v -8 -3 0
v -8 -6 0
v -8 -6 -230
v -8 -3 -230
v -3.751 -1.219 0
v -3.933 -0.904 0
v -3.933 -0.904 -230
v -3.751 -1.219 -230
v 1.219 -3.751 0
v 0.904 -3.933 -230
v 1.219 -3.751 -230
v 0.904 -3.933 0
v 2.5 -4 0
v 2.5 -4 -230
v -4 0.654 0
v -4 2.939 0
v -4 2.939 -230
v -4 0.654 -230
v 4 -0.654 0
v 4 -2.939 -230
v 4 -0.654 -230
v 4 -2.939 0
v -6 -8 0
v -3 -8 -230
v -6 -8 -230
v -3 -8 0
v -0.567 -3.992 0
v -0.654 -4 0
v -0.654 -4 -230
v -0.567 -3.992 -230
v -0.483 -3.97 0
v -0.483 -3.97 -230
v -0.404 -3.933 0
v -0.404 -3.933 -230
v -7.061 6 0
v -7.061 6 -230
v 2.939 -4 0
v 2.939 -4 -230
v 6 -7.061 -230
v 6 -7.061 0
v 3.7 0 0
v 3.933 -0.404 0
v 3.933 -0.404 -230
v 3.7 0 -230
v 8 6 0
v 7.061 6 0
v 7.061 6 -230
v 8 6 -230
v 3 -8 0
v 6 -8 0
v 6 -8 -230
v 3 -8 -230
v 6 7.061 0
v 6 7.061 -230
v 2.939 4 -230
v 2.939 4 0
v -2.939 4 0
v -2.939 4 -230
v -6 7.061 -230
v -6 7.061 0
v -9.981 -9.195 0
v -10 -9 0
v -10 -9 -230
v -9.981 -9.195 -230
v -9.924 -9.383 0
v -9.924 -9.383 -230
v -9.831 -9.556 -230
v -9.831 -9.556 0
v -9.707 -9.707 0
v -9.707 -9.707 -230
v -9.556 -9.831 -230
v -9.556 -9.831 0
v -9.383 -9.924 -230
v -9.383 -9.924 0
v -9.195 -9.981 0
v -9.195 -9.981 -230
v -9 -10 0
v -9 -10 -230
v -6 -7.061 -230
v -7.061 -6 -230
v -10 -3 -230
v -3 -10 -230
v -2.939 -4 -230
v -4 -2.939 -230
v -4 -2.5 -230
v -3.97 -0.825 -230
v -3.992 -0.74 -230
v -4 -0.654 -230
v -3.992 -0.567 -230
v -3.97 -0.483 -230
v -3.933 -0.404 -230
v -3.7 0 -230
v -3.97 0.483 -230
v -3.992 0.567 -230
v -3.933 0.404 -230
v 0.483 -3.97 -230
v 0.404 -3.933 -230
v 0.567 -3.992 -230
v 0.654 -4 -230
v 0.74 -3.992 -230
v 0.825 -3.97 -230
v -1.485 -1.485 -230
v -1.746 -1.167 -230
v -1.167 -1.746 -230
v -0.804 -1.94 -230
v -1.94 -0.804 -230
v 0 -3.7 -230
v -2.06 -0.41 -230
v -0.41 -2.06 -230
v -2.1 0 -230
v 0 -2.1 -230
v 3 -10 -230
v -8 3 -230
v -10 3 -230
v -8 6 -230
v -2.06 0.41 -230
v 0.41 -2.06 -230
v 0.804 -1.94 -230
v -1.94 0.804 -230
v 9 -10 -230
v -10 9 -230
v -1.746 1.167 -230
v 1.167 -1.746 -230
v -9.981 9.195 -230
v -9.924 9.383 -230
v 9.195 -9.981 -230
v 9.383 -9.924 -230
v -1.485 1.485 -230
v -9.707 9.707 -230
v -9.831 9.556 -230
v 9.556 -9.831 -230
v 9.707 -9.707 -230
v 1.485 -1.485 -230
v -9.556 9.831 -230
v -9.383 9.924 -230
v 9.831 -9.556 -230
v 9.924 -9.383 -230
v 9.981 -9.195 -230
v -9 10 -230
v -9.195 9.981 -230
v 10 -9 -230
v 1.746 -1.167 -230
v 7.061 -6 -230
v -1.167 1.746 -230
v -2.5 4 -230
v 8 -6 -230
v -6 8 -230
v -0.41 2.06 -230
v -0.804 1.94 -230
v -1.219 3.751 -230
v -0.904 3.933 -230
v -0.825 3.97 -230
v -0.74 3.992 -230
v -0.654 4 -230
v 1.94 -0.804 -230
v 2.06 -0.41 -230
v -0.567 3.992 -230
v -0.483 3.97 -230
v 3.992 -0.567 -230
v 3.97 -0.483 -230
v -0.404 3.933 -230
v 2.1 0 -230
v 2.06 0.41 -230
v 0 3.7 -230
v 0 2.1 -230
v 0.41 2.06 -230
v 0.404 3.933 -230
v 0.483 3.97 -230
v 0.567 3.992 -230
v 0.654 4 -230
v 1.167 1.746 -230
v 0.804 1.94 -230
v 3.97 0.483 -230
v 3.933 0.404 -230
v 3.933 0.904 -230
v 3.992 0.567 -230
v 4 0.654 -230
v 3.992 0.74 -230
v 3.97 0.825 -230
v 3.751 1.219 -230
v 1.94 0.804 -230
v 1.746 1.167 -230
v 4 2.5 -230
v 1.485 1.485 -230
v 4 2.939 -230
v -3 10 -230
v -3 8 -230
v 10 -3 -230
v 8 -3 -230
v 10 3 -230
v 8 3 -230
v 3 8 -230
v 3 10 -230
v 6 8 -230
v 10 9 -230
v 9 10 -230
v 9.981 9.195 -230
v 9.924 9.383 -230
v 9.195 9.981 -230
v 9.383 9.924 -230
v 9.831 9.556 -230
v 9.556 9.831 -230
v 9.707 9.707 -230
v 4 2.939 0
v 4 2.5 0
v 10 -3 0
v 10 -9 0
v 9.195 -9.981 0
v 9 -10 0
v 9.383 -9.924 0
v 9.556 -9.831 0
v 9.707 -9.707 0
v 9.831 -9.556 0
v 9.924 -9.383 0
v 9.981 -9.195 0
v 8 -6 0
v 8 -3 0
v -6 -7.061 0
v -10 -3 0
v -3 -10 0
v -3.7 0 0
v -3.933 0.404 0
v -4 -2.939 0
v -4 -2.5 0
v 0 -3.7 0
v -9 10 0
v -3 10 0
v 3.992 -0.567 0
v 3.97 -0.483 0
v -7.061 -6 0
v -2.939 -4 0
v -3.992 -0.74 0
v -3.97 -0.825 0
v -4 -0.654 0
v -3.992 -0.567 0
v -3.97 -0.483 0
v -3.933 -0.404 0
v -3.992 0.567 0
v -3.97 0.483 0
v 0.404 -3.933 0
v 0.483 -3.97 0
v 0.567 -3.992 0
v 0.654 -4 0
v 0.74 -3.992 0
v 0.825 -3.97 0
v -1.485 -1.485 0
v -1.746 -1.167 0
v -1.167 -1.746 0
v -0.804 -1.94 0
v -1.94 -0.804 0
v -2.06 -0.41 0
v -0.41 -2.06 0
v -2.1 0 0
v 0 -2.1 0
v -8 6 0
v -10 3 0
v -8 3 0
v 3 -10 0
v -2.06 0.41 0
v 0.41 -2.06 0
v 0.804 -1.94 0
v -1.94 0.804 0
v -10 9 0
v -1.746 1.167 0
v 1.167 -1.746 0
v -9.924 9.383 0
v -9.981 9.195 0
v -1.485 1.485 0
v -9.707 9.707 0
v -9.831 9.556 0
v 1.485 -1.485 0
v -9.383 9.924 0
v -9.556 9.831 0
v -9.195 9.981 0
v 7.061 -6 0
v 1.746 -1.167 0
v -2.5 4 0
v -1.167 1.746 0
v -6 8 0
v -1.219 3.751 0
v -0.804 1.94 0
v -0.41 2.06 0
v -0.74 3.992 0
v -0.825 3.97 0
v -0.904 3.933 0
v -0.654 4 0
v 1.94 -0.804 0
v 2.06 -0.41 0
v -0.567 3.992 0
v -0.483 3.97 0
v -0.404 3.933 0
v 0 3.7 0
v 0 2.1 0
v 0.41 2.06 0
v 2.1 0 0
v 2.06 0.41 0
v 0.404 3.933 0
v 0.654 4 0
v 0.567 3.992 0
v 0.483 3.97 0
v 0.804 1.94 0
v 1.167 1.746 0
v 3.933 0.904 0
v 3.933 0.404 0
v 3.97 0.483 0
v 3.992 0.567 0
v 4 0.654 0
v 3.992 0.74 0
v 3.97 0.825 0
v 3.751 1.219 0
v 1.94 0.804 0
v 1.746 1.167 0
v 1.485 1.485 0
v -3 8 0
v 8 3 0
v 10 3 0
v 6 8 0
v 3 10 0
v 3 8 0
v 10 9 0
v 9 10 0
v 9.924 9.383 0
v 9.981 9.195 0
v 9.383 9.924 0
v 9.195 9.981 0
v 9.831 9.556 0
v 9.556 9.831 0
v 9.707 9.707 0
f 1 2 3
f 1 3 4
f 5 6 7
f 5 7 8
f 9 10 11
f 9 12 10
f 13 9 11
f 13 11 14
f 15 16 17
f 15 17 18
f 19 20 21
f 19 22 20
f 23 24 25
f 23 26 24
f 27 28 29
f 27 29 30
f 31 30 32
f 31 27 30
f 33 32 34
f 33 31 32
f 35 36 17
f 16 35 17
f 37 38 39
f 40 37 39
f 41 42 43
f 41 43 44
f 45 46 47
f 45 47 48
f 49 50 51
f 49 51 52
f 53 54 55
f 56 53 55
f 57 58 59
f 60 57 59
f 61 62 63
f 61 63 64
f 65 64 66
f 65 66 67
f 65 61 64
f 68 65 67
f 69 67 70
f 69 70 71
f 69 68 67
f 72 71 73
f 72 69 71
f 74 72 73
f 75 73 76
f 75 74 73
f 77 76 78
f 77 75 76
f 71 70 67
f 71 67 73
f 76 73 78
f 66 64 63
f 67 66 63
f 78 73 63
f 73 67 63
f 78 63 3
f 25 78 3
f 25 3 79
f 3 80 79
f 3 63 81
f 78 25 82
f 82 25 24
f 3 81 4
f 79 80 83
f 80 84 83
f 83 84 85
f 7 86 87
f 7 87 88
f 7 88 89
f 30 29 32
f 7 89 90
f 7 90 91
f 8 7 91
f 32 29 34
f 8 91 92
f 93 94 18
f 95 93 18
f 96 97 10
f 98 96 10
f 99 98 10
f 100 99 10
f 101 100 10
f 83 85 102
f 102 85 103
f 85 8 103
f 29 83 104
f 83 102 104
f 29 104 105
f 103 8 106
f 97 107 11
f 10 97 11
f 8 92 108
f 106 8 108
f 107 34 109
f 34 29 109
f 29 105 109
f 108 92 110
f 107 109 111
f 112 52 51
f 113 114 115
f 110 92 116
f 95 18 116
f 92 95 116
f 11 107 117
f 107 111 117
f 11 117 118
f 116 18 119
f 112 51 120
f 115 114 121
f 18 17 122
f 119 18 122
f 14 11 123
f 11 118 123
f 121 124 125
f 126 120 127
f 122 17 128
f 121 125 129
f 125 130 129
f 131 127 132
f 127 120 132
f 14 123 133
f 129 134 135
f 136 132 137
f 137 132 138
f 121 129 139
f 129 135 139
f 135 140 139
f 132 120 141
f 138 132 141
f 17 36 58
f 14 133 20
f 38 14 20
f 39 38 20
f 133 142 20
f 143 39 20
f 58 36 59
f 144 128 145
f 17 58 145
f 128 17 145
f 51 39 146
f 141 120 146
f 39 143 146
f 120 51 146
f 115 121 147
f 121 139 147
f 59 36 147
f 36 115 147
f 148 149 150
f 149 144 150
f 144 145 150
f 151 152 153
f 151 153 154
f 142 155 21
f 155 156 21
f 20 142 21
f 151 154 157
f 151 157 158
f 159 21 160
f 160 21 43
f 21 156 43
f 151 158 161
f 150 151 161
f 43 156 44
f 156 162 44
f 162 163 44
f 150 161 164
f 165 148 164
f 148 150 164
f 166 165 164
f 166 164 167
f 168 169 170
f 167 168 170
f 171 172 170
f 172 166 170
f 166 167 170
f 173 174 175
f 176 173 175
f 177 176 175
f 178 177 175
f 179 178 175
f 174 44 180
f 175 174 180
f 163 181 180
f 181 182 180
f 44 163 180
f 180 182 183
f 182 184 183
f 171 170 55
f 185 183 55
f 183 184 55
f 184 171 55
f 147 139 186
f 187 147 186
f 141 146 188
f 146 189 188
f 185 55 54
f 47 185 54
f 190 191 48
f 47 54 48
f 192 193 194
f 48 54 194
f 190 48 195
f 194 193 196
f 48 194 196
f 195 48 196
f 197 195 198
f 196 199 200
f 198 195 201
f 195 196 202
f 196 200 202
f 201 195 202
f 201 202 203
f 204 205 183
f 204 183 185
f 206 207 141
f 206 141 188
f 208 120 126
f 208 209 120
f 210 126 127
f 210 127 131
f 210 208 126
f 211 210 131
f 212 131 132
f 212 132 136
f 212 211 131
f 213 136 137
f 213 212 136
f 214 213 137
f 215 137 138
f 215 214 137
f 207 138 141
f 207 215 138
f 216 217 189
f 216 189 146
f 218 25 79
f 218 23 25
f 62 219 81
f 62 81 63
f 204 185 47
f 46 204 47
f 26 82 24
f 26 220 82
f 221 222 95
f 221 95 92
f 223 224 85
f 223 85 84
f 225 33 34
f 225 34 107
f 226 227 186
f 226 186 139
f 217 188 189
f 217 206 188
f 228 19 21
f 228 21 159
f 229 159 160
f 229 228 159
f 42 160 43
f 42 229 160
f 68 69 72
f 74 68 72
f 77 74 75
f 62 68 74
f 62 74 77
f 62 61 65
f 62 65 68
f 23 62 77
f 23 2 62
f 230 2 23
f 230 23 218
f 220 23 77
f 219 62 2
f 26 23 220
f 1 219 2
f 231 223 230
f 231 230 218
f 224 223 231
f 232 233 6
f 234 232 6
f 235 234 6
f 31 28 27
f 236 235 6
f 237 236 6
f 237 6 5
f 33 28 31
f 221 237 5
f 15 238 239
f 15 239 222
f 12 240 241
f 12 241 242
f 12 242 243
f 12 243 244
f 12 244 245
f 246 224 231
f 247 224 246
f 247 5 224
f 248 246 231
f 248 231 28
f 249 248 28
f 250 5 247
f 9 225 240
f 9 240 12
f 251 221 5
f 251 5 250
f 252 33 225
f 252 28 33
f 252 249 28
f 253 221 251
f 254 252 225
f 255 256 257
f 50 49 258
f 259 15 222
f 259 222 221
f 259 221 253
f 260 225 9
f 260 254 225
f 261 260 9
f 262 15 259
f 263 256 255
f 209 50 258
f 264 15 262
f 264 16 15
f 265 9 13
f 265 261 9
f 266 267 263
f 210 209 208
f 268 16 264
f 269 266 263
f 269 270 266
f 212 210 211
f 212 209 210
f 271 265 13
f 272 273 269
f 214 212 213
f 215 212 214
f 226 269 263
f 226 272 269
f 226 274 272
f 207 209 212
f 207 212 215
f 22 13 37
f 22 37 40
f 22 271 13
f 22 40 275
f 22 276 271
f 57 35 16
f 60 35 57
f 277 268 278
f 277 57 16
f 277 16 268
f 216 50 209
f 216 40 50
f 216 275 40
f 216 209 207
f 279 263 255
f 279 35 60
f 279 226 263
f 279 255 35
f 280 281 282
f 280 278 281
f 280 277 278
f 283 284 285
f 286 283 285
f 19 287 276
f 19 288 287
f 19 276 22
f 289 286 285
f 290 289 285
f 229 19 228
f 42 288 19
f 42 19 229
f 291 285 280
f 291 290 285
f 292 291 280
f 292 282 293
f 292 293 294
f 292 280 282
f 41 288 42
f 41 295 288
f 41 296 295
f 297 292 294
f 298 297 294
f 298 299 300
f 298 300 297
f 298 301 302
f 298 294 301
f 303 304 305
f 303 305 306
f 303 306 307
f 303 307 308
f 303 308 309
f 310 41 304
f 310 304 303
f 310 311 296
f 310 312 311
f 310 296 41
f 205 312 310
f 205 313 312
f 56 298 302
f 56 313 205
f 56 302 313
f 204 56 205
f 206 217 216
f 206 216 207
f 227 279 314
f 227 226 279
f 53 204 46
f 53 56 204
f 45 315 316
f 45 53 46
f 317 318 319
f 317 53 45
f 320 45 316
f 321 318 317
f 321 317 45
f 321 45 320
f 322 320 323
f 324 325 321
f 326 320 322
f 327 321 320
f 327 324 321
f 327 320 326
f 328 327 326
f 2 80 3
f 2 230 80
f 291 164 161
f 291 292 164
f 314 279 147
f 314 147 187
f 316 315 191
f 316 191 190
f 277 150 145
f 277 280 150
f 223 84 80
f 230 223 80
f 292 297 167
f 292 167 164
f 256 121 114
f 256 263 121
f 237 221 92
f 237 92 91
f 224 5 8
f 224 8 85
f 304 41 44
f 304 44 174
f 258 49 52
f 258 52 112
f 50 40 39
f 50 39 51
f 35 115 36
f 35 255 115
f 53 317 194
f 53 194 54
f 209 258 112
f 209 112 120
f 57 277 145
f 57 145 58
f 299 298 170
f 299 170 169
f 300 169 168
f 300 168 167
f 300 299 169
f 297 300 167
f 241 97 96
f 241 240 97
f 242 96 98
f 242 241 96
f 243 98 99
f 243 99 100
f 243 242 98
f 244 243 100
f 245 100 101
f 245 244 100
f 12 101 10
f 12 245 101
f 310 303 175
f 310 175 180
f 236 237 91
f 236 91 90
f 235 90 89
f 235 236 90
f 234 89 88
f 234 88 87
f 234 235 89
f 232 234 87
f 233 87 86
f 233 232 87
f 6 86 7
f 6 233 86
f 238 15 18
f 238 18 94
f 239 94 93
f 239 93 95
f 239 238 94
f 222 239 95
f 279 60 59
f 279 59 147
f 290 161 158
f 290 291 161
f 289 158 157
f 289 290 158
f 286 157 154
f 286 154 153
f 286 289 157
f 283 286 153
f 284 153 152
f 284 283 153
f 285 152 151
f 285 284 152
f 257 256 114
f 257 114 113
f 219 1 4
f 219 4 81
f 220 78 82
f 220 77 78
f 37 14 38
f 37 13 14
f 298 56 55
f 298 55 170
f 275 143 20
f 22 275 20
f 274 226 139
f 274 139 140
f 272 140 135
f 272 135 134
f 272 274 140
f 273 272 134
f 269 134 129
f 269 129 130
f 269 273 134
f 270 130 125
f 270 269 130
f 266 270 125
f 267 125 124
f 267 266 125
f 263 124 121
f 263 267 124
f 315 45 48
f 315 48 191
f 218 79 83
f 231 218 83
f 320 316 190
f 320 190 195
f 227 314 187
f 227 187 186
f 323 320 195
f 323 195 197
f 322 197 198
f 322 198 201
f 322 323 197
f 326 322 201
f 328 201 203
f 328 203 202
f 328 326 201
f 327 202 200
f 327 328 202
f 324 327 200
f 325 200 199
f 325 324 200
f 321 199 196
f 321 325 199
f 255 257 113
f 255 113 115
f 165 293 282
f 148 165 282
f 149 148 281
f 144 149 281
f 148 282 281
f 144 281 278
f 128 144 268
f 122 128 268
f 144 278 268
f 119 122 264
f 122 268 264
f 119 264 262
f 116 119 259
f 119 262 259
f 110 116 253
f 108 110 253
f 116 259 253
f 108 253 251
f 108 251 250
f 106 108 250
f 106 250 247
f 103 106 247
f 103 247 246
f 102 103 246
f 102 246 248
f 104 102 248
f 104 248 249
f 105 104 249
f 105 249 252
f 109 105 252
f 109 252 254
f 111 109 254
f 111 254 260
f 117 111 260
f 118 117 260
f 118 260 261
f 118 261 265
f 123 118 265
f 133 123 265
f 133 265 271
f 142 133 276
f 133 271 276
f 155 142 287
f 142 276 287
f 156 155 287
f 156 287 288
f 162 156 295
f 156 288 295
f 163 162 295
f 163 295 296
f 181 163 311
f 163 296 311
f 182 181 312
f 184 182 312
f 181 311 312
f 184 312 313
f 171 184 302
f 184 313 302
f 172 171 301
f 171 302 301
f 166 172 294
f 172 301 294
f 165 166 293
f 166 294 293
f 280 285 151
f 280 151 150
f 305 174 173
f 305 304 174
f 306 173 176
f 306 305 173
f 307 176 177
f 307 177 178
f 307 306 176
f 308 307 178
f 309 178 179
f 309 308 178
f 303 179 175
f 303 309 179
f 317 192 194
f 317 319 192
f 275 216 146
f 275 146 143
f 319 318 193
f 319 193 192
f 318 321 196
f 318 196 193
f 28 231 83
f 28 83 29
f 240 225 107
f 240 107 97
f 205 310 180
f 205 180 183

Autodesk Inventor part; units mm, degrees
sketch "Sketch_75" plane through (0, 0, 0) normal (0, 0, 1) x (1, 0, 0)
  line L0 (-10, 3) -> (-8, 3)
  line L1 (-8, 3) -> (-8, 6)
  line L2 (-8, 6) -> (-7.0607, 6)
  line L3 (-7.0607, 6) -> (-4, 2.9393)
  line L4 (-4, 2.9393) -> (-4, 0.6536)
  arc A0 (-4, 0.6536) -> (-3.933, 0.4036) centre (-3.5, 0.6536) ccw
  line L5 (-3.933, 0.4036) -> (-3.7, 0)
  line L6 (-3.7, 0) -> (-3.933, -0.4036)
  arc A1 (-3.933, -0.4036) -> (-3.933, -0.9036) centre (-3.5, -0.6536) ccw
  line L7 (-3.933, -0.9036) -> (-3.751, -1.2189)
  line L8 (-3.751, -1.2189) -> (-4, -2.5)
  line L9 (-4, -2.5) -> (-4, -2.9393)
  line L10 (-4, -2.9393) -> (-7.0607, -6)
  line L11 (-7.0607, -6) -> (-8, -6)
  line L12 (-8, -6) -> (-8, -3)
  line L13 (-8, -3) -> (-10, -3)
  line L14 (-10, -3) -> (-10, -9)
  arc A2 (-10, -9) -> (-9, -10) centre (-9, -9) ccw
  line L15 (-9, -10) -> (-3, -10)
  line L16 (-3, -10) -> (-3, -8)
  line L17 (-3, -8) -> (-6, -8)
  line L18 (-6, -8) -> (-6, -7.0607)
  line L19 (-6, -7.0607) -> (-2.9393, -4)
  line L20 (-2.9393, -4) -> (-0.6536, -4)
  arc A3 (-0.6536, -4) -> (-0.4036, -3.933) centre (-0.6536, -3.5) ccw
  line L21 (-0.4036, -3.933) -> (0, -3.7)
  line L22 (0, -3.7) -> (0.4036, -3.933)
  arc A4 (0.4036, -3.933) -> (0.9036, -3.933) centre (0.6536, -3.5) ccw
  line L23 (0.9036, -3.933) -> (1.2189, -3.751)
  line L24 (1.2189, -3.751) -> (2.5, -4)
  line L25 (2.5, -4) -> (2.9393, -4)
  line L26 (2.9393, -4) -> (6, -7.0607)
  line L27 (6, -7.0607) -> (6, -8)
  line L28 (6, -8) -> (3, -8)
  line L29 (3, -8) -> (3, -10)
  line L30 (3, -10) -> (9, -10)
  arc A5 (9, -10) -> (10, -9) centre (9, -9) ccw
  line L31 (10, -9) -> (10, -3)
  line L32 (10, -3) -> (8, -3)
  line L33 (8, -3) -> (8, -6)
  line L34 (8, -6) -> (7.0607, -6)
  line L35 (7.0607, -6) -> (4, -2.9393)
  line L36 (4, -2.9393) -> (4, -0.6536)
  arc A6 (4, -0.6536) -> (3.933, -0.4036) centre (3.5, -0.6536) ccw
  line L37 (3.933, -0.4036) -> (3.7, 0)
  line L38 (3.7, 0) -> (3.933, 0.4036)
  arc A7 (3.933, 0.4036) -> (3.933, 0.9036) centre (3.5, 0.6536) ccw
  line L39 (3.933, 0.9036) -> (3.751, 1.2189)
  line L40 (3.751, 1.2189) -> (4, 2.5)
  line L41 (4, 2.5) -> (4, 2.9393)
  line L42 (4, 2.9393) -> (7.0607, 6)
  line L43 (7.0607, 6) -> (8, 6)
  line L44 (8, 6) -> (8, 3)
  line L45 (8, 3) -> (10, 3)
  line L46 (10, 3) -> (10, 9)
  arc A8 (10, 9) -> (9, 10) centre (9, 9) ccw
  line L47 (9, 10) -> (3, 10)
  line L48 (3, 10) -> (3, 8)
  line L49 (3, 8) -> (6, 8)
  line L50 (6, 8) -> (6, 7.0607)
  line L51 (6, 7.0607) -> (2.9393, 4)
  line L52 (2.9393, 4) -> (0.6536, 4)
  arc A9 (0.6536, 4) -> (0.4036, 3.933) centre (0.6536, 3.5) ccw
  line L53 (0.4036, 3.933) -> (0, 3.7)
  line L54 (0, 3.7) -> (-0.4036, 3.933)
  arc A10 (-0.4036, 3.933) -> (-0.9036, 3.933) centre (-0.6536, 3.5) ccw
  line L55 (-0.9036, 3.933) -> (-1.2189, 3.751)
  line L56 (-1.2189, 3.751) -> (-2.5, 4)
  line L57 (-2.5, 4) -> (-2.9393, 4)
  line L58 (-2.9393, 4) -> (-6, 7.0607)
  line L59 (-6, 7.0607) -> (-6, 8)
  line L60 (-6, 8) -> (-3, 8)
  line L61 (-3, 8) -> (-3, 10)
  line L62 (-3, 10) -> (-9, 10)
  arc A11 (-9, 10) -> (-10, 9) centre (-9, 9) ccw
  line L63 (-10, 9) -> (-10, 3)
extrude "Extrusion1" add sketch "Sketch_75" against normal blind 230
sketch "Sketch2" plane through (0, 0, -230) normal (0, 0, -1) x (-1, 0, 0)
  point P0 (0, 0)
hole "Hole1" at (0, 0, -230) direction (0, 0, 1) diameter 4.2 depth 230
ref_plane "C1_XY" through (0, 0, 0) normal (0, 0, 1) x (1, 0, 0)
ref_plane "C1_YZ" through (0, 0, 0) normal (1, 0, 0) x (0, 1, 0)
ref_plane "C1_ZX" through (0, 0, 0) normal (0, 1, 0) x (0, 0, 1)
properties part number "NFS5-2020-230"
